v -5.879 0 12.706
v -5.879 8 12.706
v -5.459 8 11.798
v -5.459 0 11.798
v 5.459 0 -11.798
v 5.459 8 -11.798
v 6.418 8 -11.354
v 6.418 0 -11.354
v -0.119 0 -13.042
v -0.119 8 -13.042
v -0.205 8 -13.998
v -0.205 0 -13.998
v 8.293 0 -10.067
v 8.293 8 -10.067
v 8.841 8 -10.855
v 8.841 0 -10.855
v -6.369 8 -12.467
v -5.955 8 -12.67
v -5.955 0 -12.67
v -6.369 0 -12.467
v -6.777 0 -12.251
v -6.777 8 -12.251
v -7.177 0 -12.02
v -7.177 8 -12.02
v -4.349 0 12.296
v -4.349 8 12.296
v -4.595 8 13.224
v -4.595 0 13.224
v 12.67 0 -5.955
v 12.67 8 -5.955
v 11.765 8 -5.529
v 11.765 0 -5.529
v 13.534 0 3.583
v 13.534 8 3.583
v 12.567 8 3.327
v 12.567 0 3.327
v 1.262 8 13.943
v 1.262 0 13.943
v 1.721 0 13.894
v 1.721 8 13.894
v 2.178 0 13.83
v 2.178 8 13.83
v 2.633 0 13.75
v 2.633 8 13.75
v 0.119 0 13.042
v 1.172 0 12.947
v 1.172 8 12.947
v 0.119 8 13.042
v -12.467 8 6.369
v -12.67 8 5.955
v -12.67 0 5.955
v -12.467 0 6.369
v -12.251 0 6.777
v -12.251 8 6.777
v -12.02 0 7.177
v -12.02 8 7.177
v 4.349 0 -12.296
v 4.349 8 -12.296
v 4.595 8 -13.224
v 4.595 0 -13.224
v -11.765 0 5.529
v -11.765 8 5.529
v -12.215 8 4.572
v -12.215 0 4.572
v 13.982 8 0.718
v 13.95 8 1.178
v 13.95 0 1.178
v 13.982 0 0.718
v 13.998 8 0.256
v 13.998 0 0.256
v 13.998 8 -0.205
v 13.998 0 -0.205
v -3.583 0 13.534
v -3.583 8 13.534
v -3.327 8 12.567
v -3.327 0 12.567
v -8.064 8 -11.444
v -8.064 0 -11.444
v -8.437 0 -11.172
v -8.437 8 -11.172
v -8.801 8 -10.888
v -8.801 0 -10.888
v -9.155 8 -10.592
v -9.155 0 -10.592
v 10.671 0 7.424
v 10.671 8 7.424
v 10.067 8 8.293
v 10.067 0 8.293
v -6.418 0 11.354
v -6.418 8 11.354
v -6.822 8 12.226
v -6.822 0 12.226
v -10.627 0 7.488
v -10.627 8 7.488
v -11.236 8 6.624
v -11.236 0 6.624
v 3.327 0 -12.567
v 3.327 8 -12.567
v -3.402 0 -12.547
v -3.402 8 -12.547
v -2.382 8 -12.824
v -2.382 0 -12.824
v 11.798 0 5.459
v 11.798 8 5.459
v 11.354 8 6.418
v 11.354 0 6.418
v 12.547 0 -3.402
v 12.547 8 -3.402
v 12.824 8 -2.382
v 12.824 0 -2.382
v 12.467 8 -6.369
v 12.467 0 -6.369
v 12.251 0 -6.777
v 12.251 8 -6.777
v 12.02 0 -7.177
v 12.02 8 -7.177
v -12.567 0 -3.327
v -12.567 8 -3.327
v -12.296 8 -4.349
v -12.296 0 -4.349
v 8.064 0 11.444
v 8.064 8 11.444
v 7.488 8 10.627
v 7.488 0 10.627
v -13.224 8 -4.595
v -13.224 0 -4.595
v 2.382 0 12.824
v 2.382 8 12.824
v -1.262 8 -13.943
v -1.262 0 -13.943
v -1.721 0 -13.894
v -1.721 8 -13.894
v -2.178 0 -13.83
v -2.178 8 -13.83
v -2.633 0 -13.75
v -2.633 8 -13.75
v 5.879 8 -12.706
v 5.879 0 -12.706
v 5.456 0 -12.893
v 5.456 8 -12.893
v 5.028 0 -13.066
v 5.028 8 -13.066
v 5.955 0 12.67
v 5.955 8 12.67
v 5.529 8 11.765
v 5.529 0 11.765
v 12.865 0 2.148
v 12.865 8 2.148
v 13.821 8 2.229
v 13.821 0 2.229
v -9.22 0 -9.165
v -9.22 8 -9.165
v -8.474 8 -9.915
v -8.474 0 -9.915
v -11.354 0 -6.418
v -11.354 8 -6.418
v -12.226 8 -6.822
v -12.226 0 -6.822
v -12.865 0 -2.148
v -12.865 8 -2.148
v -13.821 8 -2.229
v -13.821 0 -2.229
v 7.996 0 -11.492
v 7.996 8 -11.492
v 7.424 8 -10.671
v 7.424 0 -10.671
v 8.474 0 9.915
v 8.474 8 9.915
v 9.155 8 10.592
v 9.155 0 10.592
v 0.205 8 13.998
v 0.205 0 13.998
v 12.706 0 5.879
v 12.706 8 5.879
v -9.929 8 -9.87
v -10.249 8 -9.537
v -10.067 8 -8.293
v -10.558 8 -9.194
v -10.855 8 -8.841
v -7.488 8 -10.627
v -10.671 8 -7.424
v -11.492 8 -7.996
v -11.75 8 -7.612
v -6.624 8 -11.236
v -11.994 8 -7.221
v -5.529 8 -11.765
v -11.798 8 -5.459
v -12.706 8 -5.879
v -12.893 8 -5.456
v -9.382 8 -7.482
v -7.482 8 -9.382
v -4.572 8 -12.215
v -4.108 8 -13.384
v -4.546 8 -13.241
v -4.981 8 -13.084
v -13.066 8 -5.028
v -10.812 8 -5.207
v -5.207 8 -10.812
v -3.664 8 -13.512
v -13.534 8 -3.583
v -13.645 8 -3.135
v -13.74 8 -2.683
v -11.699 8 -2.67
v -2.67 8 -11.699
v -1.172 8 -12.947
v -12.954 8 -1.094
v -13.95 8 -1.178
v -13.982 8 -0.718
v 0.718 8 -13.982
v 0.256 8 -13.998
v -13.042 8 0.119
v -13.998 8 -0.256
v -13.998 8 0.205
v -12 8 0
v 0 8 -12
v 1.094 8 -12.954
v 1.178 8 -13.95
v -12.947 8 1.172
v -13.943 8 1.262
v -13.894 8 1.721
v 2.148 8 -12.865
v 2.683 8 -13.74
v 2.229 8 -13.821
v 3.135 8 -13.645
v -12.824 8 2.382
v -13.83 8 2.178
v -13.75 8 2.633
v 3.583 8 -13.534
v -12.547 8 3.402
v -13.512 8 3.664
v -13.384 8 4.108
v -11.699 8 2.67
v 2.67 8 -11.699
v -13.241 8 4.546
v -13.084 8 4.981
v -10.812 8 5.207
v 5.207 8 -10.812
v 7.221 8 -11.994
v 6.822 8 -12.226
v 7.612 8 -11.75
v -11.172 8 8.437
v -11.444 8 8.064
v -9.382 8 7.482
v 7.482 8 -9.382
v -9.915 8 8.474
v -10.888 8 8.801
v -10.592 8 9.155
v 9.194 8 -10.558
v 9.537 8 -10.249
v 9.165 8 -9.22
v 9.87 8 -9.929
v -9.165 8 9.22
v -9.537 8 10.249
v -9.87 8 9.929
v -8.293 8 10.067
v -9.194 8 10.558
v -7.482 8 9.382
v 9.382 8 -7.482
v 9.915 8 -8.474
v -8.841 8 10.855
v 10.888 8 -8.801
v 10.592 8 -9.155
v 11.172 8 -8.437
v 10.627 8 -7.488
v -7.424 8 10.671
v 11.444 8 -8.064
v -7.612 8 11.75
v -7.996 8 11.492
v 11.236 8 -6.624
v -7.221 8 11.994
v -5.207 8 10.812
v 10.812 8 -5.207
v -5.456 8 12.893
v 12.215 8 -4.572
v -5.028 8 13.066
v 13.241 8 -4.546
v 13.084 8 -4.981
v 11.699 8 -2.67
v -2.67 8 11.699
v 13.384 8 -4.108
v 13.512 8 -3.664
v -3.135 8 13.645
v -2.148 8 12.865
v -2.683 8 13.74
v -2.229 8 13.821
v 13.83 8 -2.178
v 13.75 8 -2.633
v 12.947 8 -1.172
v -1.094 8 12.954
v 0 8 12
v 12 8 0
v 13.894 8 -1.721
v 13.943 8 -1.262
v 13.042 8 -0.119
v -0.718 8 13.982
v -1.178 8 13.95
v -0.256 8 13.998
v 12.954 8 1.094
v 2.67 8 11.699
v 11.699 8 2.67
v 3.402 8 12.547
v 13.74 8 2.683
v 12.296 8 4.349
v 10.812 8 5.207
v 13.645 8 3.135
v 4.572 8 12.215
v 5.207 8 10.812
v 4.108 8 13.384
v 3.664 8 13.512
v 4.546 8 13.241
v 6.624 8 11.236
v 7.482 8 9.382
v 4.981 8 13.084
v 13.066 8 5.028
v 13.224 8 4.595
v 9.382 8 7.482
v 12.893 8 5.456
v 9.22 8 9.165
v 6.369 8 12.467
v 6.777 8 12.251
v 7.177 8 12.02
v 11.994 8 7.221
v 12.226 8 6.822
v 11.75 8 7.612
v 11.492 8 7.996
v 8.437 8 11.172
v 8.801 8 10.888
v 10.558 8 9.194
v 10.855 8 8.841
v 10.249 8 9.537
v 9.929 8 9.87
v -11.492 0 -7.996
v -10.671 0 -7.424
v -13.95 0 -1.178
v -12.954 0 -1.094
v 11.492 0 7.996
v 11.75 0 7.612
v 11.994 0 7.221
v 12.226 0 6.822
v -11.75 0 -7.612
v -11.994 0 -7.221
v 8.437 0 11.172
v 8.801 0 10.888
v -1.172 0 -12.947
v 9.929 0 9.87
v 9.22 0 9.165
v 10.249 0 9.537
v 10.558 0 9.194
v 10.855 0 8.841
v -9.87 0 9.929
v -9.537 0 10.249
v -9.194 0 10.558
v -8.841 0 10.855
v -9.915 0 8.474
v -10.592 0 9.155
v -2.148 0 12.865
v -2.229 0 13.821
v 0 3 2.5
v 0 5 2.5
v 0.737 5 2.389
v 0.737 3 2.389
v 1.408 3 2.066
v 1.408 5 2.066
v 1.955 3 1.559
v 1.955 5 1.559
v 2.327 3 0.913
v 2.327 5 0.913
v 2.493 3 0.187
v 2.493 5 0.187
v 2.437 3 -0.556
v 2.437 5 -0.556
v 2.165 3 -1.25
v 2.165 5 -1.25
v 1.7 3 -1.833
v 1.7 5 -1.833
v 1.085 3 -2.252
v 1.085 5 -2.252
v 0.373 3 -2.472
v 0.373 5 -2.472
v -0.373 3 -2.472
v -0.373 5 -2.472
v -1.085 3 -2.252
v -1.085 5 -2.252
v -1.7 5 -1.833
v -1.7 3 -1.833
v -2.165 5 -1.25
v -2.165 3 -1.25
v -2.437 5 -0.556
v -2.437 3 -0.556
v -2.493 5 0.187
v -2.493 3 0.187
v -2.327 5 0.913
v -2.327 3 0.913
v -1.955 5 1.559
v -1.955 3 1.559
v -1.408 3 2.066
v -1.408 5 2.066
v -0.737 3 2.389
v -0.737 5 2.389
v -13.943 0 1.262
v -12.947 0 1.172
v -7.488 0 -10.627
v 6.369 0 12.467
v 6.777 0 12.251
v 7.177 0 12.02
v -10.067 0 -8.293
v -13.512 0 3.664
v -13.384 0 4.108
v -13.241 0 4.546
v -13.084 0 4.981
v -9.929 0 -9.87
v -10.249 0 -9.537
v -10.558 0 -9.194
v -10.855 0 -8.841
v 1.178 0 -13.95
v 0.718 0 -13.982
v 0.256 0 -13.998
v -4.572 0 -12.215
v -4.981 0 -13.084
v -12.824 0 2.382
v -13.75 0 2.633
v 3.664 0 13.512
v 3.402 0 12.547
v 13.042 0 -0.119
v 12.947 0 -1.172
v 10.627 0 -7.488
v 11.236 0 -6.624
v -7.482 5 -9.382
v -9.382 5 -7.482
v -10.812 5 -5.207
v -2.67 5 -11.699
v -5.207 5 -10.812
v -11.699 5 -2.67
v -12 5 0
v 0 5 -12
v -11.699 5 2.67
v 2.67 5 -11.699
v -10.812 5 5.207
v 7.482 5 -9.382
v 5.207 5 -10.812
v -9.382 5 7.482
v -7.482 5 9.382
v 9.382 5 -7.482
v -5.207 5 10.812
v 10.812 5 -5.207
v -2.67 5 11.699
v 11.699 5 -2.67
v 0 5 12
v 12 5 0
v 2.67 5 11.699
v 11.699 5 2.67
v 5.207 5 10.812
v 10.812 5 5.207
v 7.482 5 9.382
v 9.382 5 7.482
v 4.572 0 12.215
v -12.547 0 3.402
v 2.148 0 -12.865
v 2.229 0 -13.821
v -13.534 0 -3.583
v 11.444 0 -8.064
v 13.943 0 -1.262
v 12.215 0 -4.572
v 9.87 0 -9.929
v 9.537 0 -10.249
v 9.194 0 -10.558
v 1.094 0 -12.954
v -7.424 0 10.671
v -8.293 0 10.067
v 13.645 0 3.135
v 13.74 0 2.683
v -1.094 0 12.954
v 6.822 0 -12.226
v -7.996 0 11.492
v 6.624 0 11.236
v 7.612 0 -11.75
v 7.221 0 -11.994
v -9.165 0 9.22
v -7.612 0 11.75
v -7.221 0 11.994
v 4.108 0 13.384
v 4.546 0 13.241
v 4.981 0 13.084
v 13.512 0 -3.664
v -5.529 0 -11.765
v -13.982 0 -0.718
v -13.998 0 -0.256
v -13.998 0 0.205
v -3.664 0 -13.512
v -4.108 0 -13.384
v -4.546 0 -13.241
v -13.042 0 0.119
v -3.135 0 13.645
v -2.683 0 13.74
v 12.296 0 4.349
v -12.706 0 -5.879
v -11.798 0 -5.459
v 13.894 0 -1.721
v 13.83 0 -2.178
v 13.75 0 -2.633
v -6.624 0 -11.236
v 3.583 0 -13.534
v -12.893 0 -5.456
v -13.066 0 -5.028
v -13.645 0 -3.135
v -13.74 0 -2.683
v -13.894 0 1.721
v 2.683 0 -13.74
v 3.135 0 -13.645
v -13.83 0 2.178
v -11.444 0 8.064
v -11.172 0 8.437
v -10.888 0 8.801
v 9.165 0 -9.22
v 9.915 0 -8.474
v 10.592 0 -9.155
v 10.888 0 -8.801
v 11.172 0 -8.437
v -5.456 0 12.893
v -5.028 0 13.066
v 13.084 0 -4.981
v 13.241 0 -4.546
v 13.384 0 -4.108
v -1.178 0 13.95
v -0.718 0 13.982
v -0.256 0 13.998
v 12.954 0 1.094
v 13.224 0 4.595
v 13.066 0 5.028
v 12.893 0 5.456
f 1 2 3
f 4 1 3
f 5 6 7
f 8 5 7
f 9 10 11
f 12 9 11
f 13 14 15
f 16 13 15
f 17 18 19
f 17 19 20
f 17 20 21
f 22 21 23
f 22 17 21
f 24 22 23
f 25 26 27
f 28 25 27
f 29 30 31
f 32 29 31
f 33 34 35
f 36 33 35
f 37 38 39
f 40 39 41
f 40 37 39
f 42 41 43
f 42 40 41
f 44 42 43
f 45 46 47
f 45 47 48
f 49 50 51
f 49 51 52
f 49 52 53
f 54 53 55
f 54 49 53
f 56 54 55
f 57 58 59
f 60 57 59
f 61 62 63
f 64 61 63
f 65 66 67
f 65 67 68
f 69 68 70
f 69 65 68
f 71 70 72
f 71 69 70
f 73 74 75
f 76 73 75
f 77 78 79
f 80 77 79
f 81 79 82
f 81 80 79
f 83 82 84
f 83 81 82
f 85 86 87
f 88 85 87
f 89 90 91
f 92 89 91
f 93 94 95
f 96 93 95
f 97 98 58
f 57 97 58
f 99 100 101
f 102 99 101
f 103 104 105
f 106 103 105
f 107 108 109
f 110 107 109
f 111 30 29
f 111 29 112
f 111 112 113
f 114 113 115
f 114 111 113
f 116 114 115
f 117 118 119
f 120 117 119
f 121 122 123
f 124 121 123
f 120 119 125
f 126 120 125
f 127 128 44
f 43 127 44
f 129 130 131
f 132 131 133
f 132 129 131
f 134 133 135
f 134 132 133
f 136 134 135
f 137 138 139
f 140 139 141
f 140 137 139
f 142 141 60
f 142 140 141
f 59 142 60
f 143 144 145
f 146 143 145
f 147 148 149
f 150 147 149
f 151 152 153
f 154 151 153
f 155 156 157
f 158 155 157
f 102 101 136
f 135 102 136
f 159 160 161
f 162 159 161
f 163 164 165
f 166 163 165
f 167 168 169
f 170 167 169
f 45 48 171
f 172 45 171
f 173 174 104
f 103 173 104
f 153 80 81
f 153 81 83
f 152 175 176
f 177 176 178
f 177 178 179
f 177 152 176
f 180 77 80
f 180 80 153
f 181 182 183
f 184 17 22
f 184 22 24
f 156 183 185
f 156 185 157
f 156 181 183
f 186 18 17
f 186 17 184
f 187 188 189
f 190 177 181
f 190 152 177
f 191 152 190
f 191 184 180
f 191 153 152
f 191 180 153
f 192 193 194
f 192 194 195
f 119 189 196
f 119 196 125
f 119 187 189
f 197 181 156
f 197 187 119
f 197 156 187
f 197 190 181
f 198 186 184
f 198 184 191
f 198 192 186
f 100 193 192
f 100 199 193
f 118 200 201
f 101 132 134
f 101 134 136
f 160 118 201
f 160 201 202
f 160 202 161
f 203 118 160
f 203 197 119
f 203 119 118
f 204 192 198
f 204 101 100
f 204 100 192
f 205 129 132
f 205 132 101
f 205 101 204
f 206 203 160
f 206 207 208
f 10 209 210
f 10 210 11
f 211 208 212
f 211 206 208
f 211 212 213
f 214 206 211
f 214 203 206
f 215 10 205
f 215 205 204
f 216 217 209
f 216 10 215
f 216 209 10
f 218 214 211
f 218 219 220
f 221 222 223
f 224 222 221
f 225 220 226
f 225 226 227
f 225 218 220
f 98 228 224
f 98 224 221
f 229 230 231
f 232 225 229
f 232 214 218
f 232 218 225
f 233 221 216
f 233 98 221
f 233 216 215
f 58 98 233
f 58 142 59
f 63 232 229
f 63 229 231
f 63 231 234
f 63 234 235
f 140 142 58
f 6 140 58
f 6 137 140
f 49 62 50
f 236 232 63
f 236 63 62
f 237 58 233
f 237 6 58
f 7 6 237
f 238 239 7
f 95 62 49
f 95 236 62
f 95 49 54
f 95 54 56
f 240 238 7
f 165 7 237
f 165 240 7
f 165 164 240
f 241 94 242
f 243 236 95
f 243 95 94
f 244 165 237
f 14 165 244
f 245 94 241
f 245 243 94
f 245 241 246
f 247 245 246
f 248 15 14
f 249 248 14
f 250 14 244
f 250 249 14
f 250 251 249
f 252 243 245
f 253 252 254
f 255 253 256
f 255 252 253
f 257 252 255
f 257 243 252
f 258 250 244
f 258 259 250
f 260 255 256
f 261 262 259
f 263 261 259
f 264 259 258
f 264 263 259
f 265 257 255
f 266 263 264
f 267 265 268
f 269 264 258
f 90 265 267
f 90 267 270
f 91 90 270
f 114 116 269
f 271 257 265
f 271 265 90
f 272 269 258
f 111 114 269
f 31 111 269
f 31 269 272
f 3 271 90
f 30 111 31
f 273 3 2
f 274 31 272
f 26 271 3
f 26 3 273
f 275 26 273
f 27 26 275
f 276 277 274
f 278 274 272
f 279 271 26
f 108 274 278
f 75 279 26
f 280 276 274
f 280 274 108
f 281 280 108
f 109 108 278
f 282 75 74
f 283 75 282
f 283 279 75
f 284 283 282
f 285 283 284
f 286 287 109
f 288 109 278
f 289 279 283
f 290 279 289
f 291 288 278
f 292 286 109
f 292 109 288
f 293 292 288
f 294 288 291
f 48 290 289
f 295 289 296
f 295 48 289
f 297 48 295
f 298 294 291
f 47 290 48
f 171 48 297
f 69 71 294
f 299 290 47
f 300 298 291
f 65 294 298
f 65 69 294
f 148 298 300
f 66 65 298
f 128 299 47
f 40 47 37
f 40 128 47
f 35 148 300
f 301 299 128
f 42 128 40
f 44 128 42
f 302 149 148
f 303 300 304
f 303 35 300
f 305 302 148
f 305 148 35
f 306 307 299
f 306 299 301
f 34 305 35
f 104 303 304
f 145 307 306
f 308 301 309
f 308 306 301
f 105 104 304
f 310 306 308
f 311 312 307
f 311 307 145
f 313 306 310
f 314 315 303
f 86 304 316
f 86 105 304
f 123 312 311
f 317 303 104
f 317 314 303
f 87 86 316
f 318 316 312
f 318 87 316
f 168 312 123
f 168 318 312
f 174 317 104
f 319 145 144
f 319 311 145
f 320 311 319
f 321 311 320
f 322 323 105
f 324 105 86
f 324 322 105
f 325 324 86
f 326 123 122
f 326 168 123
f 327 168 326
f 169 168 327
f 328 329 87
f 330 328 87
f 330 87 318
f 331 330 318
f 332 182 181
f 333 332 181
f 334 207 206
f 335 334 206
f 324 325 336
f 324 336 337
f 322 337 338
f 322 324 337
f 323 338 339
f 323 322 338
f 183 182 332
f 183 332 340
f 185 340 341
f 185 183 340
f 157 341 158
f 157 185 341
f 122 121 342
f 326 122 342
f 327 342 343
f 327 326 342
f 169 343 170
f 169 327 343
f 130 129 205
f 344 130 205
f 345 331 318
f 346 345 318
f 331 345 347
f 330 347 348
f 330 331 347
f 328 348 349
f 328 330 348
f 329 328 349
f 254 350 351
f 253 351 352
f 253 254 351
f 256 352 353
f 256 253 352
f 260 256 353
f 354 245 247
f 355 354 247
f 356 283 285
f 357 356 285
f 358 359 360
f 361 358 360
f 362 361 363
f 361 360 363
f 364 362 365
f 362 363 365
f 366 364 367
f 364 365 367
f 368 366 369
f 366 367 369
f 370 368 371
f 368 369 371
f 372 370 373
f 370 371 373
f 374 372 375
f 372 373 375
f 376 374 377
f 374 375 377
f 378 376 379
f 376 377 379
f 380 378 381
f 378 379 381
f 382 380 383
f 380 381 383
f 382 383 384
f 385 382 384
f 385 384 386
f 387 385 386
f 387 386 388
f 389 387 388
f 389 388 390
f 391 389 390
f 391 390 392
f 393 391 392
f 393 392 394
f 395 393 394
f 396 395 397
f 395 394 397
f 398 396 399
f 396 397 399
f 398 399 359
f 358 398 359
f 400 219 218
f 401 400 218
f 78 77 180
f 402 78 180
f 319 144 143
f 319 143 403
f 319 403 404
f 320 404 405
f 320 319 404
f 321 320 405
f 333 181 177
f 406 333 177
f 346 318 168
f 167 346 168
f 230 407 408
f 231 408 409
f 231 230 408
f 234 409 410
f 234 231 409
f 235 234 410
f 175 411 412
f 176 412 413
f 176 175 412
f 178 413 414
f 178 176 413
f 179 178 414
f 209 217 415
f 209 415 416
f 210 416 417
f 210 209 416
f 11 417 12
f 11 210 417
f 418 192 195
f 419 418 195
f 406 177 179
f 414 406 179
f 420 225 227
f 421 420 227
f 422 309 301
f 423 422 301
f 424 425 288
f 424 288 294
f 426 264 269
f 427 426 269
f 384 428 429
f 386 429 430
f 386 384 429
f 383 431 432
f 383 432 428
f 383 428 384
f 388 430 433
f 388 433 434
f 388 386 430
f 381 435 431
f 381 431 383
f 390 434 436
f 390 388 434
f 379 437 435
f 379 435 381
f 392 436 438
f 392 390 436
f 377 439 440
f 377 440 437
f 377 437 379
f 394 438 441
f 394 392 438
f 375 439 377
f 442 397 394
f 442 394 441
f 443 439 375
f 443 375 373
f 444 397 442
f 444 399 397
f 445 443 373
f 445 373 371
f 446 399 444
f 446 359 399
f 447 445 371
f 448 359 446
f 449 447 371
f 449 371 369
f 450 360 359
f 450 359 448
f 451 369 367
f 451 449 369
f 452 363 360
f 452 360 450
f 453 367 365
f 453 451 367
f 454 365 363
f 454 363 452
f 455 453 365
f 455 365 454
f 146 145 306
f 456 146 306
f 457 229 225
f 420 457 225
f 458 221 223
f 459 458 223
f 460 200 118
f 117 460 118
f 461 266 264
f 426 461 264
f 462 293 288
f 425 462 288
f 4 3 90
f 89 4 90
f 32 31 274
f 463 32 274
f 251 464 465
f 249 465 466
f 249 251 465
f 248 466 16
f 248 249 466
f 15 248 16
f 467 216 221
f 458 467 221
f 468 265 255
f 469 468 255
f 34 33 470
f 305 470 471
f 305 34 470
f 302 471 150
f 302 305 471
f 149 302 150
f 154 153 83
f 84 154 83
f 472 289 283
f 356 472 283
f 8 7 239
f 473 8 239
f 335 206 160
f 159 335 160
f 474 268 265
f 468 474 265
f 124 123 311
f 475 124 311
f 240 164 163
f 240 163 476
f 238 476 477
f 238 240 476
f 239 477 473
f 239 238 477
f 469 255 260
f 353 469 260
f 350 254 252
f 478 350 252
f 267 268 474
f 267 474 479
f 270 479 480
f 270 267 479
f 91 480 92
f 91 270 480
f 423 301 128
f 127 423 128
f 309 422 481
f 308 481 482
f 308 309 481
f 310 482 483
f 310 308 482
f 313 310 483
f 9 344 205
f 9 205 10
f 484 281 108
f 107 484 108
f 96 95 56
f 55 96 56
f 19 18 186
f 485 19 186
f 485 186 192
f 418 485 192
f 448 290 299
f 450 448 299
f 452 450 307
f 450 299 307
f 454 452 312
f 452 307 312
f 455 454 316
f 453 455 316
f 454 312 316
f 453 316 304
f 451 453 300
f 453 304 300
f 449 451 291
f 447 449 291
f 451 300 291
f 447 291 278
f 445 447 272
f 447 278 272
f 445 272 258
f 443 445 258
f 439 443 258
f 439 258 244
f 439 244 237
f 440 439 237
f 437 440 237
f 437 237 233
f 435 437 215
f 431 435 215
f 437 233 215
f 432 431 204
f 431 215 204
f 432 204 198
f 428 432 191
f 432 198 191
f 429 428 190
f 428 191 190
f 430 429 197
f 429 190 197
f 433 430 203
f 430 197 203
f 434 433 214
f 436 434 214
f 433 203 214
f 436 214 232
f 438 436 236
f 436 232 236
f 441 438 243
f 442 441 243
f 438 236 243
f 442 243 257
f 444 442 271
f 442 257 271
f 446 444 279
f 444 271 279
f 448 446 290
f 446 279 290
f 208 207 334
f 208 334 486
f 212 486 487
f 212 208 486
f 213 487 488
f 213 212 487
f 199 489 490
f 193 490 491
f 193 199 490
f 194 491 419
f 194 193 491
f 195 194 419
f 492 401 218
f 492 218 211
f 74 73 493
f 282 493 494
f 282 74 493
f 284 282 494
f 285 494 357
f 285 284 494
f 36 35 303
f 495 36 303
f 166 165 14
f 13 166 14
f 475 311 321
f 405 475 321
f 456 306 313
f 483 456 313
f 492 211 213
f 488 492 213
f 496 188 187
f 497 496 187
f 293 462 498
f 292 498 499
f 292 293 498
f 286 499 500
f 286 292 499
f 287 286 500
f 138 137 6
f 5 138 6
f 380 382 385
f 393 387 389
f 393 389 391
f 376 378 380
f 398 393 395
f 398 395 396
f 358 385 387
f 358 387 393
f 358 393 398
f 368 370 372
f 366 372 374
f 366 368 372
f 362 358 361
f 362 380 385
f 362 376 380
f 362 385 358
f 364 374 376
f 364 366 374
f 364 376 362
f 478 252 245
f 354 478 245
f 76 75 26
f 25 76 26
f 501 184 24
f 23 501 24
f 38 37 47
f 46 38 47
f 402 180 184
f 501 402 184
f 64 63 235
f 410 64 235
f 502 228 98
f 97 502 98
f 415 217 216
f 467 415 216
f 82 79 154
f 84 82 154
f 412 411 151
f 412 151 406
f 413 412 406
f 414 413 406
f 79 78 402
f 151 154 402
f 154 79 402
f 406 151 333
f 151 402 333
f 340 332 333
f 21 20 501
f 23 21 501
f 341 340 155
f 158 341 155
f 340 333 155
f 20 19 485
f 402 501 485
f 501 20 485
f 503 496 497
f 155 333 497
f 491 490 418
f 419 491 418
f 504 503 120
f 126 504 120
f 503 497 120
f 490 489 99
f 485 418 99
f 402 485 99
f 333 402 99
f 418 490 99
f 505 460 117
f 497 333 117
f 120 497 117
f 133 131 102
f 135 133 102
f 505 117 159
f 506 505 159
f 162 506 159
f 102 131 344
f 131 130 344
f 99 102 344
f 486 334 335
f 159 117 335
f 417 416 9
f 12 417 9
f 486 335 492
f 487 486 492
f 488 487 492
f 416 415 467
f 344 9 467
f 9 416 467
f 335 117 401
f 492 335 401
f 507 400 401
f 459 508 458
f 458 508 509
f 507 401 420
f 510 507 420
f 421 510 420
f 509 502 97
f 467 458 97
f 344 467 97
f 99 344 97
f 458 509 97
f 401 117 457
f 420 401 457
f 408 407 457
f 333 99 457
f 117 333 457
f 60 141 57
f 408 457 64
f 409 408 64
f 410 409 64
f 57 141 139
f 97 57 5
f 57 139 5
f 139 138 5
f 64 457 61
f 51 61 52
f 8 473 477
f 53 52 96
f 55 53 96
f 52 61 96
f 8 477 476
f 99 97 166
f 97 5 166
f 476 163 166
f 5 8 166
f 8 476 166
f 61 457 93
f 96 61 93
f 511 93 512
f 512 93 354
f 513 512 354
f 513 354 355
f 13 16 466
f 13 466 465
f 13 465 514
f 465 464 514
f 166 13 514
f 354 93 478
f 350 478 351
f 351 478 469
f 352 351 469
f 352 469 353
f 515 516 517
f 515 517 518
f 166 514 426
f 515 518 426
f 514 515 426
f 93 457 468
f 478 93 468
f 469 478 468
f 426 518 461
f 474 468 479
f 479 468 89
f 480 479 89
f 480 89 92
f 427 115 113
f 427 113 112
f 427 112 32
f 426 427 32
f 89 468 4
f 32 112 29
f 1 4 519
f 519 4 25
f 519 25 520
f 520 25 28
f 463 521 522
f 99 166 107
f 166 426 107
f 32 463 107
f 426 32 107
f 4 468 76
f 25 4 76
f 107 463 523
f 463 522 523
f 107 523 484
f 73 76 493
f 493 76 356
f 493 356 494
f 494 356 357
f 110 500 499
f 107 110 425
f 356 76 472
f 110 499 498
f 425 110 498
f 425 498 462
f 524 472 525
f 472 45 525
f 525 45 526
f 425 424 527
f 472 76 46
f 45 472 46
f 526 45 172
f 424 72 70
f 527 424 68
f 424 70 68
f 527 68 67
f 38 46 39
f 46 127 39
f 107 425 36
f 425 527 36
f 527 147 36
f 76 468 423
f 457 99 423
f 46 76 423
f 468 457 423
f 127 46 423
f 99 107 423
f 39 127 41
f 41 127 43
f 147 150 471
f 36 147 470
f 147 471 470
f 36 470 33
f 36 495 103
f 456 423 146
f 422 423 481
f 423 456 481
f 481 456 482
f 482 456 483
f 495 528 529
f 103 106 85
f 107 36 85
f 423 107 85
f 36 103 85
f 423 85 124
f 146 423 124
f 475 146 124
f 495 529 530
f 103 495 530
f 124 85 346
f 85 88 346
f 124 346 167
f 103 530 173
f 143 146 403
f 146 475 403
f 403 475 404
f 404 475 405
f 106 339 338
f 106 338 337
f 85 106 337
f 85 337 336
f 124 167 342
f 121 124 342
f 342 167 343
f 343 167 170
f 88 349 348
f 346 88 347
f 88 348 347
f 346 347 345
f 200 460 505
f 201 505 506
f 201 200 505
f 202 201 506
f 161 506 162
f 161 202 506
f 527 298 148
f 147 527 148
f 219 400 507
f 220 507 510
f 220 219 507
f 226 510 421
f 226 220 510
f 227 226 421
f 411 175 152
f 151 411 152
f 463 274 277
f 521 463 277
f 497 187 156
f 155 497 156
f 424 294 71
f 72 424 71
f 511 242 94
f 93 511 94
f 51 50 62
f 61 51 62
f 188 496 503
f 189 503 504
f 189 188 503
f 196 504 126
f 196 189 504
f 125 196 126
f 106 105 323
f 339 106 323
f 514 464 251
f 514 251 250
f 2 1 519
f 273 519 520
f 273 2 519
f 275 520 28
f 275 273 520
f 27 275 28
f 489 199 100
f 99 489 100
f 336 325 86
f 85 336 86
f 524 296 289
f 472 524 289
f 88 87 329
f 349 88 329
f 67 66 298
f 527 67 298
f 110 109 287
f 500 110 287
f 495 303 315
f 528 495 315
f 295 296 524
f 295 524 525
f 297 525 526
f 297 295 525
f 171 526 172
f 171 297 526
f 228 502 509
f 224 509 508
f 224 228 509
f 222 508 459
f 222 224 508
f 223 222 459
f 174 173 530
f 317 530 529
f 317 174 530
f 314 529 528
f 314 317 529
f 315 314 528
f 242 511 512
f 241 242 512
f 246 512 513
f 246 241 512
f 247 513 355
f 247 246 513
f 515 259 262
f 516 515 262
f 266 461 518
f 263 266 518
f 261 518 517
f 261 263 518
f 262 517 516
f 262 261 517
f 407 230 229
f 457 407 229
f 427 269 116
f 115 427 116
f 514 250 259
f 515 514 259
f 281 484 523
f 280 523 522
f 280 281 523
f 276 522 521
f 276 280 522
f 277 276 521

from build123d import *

# Parameters (mm, degrees)
SKETCH_1_R          = 13
EXTRUDE_1_DEPTH     = 8
SKETCH_6_R          = 14
EXTRUDE_4_DEPTH     = 8
SKETCH_2_R          = 12
CUT_EXTRUDE_1_DEPTH = 3
CUT_EXTRUDE_2_DEPTH = 22.354156504
SKETCH_8_R          = 2.5
CUT_EXTRUDE_3_DEPTH = 2


with BuildPart() as part:
    # 草图1 → 凸台-拉伸1 (new body)
    with BuildSketch(Plane(origin=(0, 0, 0), x_dir=(1, 0, 0), z_dir=(0, 1, 0))):
        with Locations(Location((0, 0, 0), (0, 0, 270))):
            Circle(SKETCH_1_R)
    extrude(amount=EXTRUDE_1_DEPTH)

    # 草图6 → 凸台-拉伸4 (add, through all)
    with BuildSketch(Plane(origin=(0, 8, 0), x_dir=(1, 0, 0), z_dir=(0, 1, 0))):
        with Locations(Location((0, 0, 0), (0, 0, 270))):
            Circle(SKETCH_6_R)
    extrude(amount=-EXTRUDE_4_DEPTH)

    # 草图2 → 切除-拉伸1 (cut)
    with BuildSketch(Plane(origin=(0, 8, 0), x_dir=(1, 0, 0), z_dir=(0, 1, 0))):
        with Locations(Location((0, 0, 0), (0, 0, 270))):
            Circle(SKETCH_2_R)
    extrude(amount=-CUT_EXTRUDE_1_DEPTH, mode=Mode.SUBTRACT)

    # 草图7 → 切除-拉伸2 (cut, through all)
    with BuildSketch(Plane(origin=(0, 8, 0), x_dir=(1, 0, 0), z_dir=(0, 1, 0))):
        Polygon((-15.646830527, 4.142221687), (-12.567085782, 3.326913727), (-12.296421758, 4.349320163), (-15.376166503, 5.164628122), align=None)
        Polygon((-14.689830765, 6.79633564), (-11.798451005, 5.458621977), (-11.354359961, 6.418495447), (-14.245739722, 7.756209109), align=None)
        Polygon((-13.28648793, 9.243946373), (-10.671326264, 7.42447276), (-10.067301683, 8.292647994), (-12.682463348, 10.112121607), align=None)
        Polygon((-11.479441881, 11.410684473), (-9.219958675, 9.164734695), (-8.474353537, 9.914832629), (-10.733836743, 12.160782407), align=None)
        Polygon((-9.3235988, 13.230714699), (-7.488447307, 10.626530804), (-6.623916447, 11.235760092), (-8.45906794, 13.839943987), align=None)
        Polygon((-6.884462888, 14.648736355), (-5.529403257, 11.765445152), (-4.572215008, 12.215294669), (-5.927274639, 15.098585872), align=None)
        Polygon((-4.236146054, 15.621663569), (-3.402351087, 12.546872402), (-2.381589129, 12.8236737), (-3.215384096, 15.898464866), align=None)
        Polygon((-1.459116066, 16.11993444), (-1.171920201, 12.947069284), (-0.11859987, 13.042411894), (-0.405795735, 16.21527705), align=None)
        Polygon((1.362248425, 16.12840926), (1.094118888, 12.953876017), (2.147992986, 12.864863002), (2.416122524, 16.039396246), align=None)
        Polygon((4.142221687, 15.646830527), (3.326913727, 12.567085782), (4.349320163, 12.296421758), (5.164628122, 15.376166503), align=None)
        Polygon((6.79633564, 14.689830765), (5.458621977, 11.798451005), (6.418495447, 11.354359961), (7.756209109, 14.245739722), align=None)
        Polygon((9.243946373, 13.28648793), (7.42447276, 10.671326264), (8.292647994, 10.067301683), (10.112121607, 12.682463348), align=None)
        Polygon((11.410684473, 11.479441881), (9.164734695, 9.219958675), (9.914832629, 8.474353537), (12.160782407, 10.733836743), align=None)
        Polygon((13.230714699, 9.3235988), (10.626530804, 7.488447307), (11.235760092, 6.623916447), (13.839943987, 8.45906794), align=None)
        Polygon((14.648736355, 6.884462888), (11.765445152, 5.529403257), (12.215294669, 4.572215008), (15.098585872, 5.927274639), align=None)
        Polygon((15.621663569, 4.236146054), (12.546872402, 3.402351087), (12.8236737, 2.381589129), (15.898464866, 3.215384096), align=None)
        Polygon((16.11993444, 1.459116066), (12.947069284, 1.171920201), (13.042411894, 0.11859987), (16.21527705, 0.405795735), align=None)
        Polygon((16.12840926, -1.362248425), (12.953876017, -1.094118888), (12.864863002, -2.147992986), (16.039396246, -2.416122524), align=None)
        Polygon((15.646830527, -4.142221687), (12.567085782, -3.326913727), (12.296421758, -4.349320163), (15.376166503, -5.164628122), align=None)
        Polygon((14.689830765, -6.79633564), (11.798451005, -5.458621977), (11.354359961, -6.418495447), (14.245739722, -7.756209109), align=None)
        Polygon((13.28648793, -9.243946373), (10.671326264, -7.42447276), (10.067301683, -8.292647994), (12.682463348, -10.112121607), align=None)
        Polygon((11.479441881, -11.410684473), (9.219958675, -9.164734695), (8.474353537, -9.914832629), (10.733836743, -12.160782407), align=None)
        Polygon((9.3235988, -13.230714699), (7.488447307, -10.626530804), (6.623916447, -11.235760092), (8.45906794, -13.839943987), align=None)
        Polygon((6.884462888, -14.648736355), (5.529403257, -11.765445152), (4.572215008, -12.215294669), (5.927274639, -15.098585872), align=None)
        Polygon((4.236146054, -15.621663569), (3.402351087, -12.546872402), (2.381589129, -12.8236737), (3.215384096, -15.898464866), align=None)
        Polygon((1.459116066, -16.11993444), (1.171920201, -12.947069284), (0.11859987, -13.042411894), (0.405795735, -16.21527705), align=None)
        Polygon((-1.362248425, -16.12840926), (-1.094118888, -12.953876017), (-2.147992986, -12.864863002), (-2.416122524, -16.039396246), align=None)
        Polygon((-4.142221687, -15.646830527), (-3.326913727, -12.567085782), (-4.349320163, -12.296421758), (-5.164628122, -15.376166503), align=None)
        Polygon((-6.79633564, -14.689830765), (-5.458621977, -11.798451005), (-6.418495447, -11.354359961), (-7.756209109, -14.245739722), align=None)
        Polygon((-9.243946373, -13.28648793), (-7.42447276, -10.671326264), (-8.292647994, -10.067301683), (-10.112121607, -12.682463348), align=None)
        Polygon((-11.410684473, -11.479441881), (-9.164734695, -9.219958675), (-9.914832629, -8.474353537), (-12.160782407, -10.733836743), align=None)
        Polygon((-13.230714699, -9.3235988), (-10.626530804, -7.488447307), (-11.235760092, -6.623916447), (-13.839943987, -8.45906794), align=None)
        Polygon((-14.648736355, -6.884462888), (-11.765445152, -5.529403257), (-12.215294669, -4.572215008), (-15.098585872, -5.927274639), align=None)
        Polygon((-15.621663569, -4.236146054), (-12.546872402, -3.402351087), (-12.8236737, -2.381589129), (-15.898464866, -3.215384096), align=None)
        Polygon((-16.11993444, -1.459116066), (-12.947069284, -1.171920201), (-13.042411894, -0.11859987), (-16.21527705, -0.405795735), align=None)
        Polygon((-16.12840926, 1.362248425), (-12.953876017, 1.094118888), (-12.864863002, 2.147992986), (-16.039396246, 2.416122524), align=None)
    extrude(amount=-CUT_EXTRUDE_2_DEPTH, mode=Mode.SUBTRACT)

    # 草图8 → 切除-拉伸3 (cut)
    with BuildSketch(Plane(origin=(0, 5, 0), x_dir=(1, 0, 0), z_dir=(0, 1, 0))):
        with Locations(Location((0, 0, 0), (0, 0, 270))):
            Circle(SKETCH_8_R)
    extrude(amount=-CUT_EXTRUDE_3_DEPTH, mode=Mode.SUBTRACT)


solid = part.part
